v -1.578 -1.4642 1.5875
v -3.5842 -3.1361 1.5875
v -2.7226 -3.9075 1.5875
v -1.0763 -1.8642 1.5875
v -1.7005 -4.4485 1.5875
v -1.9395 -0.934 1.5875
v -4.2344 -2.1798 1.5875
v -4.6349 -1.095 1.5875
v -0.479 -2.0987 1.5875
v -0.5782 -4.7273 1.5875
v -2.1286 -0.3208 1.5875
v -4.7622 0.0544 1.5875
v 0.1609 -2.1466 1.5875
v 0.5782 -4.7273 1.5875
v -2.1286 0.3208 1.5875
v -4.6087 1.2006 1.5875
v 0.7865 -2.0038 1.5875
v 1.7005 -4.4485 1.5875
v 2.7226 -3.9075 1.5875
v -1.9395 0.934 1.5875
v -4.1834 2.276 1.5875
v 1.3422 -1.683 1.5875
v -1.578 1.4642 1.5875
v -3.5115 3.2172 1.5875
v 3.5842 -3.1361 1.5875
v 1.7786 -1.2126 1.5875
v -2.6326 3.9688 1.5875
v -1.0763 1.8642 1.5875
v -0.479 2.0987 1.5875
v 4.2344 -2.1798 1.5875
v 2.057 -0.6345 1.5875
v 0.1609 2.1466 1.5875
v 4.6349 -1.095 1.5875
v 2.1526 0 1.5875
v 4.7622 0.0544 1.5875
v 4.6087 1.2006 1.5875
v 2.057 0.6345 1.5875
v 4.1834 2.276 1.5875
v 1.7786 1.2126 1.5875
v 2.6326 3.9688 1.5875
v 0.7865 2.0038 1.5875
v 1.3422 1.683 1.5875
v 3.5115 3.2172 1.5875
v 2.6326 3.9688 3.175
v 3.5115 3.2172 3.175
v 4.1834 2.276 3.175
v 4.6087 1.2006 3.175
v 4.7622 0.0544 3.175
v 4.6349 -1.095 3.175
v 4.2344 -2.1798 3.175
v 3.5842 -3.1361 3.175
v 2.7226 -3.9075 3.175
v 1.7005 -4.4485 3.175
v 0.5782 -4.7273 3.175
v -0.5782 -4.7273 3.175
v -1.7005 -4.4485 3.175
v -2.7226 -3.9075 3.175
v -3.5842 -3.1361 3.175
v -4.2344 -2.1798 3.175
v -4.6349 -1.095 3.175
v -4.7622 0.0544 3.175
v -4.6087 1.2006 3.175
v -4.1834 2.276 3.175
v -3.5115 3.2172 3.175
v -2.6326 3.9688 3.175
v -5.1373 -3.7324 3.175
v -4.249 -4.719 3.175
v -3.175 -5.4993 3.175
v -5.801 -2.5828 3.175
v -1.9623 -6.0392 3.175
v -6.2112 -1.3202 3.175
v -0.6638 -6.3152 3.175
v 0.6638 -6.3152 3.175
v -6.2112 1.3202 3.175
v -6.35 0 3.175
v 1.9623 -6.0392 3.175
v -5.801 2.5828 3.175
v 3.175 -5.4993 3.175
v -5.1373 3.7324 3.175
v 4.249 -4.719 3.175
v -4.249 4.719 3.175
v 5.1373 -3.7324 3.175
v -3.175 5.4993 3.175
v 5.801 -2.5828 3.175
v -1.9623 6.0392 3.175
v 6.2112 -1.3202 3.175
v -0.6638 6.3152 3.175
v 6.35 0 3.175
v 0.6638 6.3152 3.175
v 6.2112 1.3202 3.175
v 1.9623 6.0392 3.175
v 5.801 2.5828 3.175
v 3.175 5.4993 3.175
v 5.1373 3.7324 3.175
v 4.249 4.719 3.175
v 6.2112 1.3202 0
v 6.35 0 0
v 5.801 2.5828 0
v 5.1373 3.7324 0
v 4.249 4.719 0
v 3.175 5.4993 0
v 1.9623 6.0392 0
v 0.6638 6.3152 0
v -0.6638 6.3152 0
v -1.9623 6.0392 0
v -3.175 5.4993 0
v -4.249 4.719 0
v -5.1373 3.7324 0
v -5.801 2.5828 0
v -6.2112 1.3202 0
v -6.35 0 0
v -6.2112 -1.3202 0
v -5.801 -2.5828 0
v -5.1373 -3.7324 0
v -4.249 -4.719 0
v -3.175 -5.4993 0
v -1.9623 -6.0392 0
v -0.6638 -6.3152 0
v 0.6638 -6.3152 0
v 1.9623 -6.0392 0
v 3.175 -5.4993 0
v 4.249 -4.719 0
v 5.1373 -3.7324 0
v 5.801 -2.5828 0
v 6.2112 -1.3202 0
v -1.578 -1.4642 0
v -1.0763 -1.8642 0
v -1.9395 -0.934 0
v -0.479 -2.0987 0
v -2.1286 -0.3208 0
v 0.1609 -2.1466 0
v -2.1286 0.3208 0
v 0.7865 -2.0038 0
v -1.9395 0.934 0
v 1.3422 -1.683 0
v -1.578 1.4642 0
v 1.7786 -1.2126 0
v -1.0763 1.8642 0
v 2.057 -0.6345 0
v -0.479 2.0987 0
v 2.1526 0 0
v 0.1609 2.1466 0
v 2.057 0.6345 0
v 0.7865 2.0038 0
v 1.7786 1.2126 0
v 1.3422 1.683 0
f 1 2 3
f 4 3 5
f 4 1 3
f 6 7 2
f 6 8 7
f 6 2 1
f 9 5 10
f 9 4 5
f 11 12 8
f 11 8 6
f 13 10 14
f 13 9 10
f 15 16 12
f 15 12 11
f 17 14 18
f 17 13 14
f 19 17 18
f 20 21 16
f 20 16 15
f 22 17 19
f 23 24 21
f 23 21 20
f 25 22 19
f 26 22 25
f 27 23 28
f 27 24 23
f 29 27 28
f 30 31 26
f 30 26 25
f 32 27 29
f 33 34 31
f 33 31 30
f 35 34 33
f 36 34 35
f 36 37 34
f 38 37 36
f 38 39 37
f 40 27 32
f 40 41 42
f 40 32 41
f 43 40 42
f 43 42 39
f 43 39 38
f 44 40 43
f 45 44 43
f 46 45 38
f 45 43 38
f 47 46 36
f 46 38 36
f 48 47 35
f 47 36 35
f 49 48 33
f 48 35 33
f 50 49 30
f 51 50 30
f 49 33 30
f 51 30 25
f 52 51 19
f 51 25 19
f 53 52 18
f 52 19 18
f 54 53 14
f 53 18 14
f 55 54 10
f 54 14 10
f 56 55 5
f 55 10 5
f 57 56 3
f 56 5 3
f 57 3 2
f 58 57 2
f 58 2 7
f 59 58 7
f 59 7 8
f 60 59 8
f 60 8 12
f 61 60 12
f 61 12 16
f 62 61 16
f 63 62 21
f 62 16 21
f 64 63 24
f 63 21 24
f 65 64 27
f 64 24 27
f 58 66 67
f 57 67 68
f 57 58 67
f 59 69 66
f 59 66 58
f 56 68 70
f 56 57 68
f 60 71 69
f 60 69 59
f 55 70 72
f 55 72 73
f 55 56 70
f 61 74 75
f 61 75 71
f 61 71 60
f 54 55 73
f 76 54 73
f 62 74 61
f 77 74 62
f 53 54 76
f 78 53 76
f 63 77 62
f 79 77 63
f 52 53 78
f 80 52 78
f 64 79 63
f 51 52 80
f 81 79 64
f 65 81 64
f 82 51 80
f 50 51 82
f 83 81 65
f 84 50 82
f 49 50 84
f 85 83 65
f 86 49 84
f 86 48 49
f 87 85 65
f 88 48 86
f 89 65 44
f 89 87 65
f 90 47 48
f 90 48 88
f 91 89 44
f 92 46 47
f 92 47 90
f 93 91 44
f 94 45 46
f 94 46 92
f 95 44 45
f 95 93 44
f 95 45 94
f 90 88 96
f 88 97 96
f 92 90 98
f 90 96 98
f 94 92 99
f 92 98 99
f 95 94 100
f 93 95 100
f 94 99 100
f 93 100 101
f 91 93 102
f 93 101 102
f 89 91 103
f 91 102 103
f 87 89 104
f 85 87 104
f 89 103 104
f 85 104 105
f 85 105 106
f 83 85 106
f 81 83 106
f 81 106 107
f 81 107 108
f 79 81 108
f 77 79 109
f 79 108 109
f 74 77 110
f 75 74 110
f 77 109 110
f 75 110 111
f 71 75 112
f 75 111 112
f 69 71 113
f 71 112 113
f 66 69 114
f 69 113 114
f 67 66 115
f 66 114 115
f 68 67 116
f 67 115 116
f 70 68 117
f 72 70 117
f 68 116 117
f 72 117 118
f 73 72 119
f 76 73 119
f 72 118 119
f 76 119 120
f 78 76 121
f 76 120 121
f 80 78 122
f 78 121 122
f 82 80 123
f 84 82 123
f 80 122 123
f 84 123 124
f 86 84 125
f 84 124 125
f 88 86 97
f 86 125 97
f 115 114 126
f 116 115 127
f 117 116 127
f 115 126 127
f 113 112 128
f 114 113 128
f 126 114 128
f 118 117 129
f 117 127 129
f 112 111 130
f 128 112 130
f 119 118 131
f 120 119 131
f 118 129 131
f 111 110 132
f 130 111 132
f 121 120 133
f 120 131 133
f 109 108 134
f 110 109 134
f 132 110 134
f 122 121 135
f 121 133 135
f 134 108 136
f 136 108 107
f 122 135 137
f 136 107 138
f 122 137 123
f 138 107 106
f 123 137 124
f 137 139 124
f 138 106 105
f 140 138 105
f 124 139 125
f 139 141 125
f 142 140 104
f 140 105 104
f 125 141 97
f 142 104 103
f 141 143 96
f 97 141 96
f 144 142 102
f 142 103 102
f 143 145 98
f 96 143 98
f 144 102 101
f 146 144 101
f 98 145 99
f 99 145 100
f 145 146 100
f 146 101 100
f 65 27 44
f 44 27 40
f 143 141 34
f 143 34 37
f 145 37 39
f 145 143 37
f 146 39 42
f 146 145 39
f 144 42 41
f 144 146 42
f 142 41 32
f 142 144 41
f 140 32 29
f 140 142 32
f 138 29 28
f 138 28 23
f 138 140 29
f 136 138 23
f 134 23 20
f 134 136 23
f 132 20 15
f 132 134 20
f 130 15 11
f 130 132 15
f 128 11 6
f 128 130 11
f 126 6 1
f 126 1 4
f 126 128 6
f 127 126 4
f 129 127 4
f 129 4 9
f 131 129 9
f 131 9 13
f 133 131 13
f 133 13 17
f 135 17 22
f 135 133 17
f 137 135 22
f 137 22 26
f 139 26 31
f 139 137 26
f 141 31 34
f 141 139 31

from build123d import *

# Parameters (mm, degrees)
F0_R     = 6.35
F0_R_2   = 2.15265
F1_DEPTH = 1.5875
F2_R     = 6.35
F3_DEPTH = 1.5875


with BuildPart() as f1:
    # F0 (on Top) → F1 (new body)
    with BuildSketch(Plane.XY):
        Circle(F0_R)
        Circle(F0_R_2, mode=Mode.SUBTRACT)
    extrude(amount=F1_DEPTH)

    # F2 (on face) → F3 (join)
    with BuildSketch(Plane.XY.offset(1.5875)):
        Circle(F2_R)
        with BuildLine():
            ThreePointArc((2.632571, 3.96875), (0, -4.7625), (-2.632571, 3.96875))
            Line((-2.632571, 3.96875), (2.632571, 3.96875))
        make_face(mode=Mode.SUBTRACT)
    extrude(amount=F3_DEPTH)


solid = f1.part
